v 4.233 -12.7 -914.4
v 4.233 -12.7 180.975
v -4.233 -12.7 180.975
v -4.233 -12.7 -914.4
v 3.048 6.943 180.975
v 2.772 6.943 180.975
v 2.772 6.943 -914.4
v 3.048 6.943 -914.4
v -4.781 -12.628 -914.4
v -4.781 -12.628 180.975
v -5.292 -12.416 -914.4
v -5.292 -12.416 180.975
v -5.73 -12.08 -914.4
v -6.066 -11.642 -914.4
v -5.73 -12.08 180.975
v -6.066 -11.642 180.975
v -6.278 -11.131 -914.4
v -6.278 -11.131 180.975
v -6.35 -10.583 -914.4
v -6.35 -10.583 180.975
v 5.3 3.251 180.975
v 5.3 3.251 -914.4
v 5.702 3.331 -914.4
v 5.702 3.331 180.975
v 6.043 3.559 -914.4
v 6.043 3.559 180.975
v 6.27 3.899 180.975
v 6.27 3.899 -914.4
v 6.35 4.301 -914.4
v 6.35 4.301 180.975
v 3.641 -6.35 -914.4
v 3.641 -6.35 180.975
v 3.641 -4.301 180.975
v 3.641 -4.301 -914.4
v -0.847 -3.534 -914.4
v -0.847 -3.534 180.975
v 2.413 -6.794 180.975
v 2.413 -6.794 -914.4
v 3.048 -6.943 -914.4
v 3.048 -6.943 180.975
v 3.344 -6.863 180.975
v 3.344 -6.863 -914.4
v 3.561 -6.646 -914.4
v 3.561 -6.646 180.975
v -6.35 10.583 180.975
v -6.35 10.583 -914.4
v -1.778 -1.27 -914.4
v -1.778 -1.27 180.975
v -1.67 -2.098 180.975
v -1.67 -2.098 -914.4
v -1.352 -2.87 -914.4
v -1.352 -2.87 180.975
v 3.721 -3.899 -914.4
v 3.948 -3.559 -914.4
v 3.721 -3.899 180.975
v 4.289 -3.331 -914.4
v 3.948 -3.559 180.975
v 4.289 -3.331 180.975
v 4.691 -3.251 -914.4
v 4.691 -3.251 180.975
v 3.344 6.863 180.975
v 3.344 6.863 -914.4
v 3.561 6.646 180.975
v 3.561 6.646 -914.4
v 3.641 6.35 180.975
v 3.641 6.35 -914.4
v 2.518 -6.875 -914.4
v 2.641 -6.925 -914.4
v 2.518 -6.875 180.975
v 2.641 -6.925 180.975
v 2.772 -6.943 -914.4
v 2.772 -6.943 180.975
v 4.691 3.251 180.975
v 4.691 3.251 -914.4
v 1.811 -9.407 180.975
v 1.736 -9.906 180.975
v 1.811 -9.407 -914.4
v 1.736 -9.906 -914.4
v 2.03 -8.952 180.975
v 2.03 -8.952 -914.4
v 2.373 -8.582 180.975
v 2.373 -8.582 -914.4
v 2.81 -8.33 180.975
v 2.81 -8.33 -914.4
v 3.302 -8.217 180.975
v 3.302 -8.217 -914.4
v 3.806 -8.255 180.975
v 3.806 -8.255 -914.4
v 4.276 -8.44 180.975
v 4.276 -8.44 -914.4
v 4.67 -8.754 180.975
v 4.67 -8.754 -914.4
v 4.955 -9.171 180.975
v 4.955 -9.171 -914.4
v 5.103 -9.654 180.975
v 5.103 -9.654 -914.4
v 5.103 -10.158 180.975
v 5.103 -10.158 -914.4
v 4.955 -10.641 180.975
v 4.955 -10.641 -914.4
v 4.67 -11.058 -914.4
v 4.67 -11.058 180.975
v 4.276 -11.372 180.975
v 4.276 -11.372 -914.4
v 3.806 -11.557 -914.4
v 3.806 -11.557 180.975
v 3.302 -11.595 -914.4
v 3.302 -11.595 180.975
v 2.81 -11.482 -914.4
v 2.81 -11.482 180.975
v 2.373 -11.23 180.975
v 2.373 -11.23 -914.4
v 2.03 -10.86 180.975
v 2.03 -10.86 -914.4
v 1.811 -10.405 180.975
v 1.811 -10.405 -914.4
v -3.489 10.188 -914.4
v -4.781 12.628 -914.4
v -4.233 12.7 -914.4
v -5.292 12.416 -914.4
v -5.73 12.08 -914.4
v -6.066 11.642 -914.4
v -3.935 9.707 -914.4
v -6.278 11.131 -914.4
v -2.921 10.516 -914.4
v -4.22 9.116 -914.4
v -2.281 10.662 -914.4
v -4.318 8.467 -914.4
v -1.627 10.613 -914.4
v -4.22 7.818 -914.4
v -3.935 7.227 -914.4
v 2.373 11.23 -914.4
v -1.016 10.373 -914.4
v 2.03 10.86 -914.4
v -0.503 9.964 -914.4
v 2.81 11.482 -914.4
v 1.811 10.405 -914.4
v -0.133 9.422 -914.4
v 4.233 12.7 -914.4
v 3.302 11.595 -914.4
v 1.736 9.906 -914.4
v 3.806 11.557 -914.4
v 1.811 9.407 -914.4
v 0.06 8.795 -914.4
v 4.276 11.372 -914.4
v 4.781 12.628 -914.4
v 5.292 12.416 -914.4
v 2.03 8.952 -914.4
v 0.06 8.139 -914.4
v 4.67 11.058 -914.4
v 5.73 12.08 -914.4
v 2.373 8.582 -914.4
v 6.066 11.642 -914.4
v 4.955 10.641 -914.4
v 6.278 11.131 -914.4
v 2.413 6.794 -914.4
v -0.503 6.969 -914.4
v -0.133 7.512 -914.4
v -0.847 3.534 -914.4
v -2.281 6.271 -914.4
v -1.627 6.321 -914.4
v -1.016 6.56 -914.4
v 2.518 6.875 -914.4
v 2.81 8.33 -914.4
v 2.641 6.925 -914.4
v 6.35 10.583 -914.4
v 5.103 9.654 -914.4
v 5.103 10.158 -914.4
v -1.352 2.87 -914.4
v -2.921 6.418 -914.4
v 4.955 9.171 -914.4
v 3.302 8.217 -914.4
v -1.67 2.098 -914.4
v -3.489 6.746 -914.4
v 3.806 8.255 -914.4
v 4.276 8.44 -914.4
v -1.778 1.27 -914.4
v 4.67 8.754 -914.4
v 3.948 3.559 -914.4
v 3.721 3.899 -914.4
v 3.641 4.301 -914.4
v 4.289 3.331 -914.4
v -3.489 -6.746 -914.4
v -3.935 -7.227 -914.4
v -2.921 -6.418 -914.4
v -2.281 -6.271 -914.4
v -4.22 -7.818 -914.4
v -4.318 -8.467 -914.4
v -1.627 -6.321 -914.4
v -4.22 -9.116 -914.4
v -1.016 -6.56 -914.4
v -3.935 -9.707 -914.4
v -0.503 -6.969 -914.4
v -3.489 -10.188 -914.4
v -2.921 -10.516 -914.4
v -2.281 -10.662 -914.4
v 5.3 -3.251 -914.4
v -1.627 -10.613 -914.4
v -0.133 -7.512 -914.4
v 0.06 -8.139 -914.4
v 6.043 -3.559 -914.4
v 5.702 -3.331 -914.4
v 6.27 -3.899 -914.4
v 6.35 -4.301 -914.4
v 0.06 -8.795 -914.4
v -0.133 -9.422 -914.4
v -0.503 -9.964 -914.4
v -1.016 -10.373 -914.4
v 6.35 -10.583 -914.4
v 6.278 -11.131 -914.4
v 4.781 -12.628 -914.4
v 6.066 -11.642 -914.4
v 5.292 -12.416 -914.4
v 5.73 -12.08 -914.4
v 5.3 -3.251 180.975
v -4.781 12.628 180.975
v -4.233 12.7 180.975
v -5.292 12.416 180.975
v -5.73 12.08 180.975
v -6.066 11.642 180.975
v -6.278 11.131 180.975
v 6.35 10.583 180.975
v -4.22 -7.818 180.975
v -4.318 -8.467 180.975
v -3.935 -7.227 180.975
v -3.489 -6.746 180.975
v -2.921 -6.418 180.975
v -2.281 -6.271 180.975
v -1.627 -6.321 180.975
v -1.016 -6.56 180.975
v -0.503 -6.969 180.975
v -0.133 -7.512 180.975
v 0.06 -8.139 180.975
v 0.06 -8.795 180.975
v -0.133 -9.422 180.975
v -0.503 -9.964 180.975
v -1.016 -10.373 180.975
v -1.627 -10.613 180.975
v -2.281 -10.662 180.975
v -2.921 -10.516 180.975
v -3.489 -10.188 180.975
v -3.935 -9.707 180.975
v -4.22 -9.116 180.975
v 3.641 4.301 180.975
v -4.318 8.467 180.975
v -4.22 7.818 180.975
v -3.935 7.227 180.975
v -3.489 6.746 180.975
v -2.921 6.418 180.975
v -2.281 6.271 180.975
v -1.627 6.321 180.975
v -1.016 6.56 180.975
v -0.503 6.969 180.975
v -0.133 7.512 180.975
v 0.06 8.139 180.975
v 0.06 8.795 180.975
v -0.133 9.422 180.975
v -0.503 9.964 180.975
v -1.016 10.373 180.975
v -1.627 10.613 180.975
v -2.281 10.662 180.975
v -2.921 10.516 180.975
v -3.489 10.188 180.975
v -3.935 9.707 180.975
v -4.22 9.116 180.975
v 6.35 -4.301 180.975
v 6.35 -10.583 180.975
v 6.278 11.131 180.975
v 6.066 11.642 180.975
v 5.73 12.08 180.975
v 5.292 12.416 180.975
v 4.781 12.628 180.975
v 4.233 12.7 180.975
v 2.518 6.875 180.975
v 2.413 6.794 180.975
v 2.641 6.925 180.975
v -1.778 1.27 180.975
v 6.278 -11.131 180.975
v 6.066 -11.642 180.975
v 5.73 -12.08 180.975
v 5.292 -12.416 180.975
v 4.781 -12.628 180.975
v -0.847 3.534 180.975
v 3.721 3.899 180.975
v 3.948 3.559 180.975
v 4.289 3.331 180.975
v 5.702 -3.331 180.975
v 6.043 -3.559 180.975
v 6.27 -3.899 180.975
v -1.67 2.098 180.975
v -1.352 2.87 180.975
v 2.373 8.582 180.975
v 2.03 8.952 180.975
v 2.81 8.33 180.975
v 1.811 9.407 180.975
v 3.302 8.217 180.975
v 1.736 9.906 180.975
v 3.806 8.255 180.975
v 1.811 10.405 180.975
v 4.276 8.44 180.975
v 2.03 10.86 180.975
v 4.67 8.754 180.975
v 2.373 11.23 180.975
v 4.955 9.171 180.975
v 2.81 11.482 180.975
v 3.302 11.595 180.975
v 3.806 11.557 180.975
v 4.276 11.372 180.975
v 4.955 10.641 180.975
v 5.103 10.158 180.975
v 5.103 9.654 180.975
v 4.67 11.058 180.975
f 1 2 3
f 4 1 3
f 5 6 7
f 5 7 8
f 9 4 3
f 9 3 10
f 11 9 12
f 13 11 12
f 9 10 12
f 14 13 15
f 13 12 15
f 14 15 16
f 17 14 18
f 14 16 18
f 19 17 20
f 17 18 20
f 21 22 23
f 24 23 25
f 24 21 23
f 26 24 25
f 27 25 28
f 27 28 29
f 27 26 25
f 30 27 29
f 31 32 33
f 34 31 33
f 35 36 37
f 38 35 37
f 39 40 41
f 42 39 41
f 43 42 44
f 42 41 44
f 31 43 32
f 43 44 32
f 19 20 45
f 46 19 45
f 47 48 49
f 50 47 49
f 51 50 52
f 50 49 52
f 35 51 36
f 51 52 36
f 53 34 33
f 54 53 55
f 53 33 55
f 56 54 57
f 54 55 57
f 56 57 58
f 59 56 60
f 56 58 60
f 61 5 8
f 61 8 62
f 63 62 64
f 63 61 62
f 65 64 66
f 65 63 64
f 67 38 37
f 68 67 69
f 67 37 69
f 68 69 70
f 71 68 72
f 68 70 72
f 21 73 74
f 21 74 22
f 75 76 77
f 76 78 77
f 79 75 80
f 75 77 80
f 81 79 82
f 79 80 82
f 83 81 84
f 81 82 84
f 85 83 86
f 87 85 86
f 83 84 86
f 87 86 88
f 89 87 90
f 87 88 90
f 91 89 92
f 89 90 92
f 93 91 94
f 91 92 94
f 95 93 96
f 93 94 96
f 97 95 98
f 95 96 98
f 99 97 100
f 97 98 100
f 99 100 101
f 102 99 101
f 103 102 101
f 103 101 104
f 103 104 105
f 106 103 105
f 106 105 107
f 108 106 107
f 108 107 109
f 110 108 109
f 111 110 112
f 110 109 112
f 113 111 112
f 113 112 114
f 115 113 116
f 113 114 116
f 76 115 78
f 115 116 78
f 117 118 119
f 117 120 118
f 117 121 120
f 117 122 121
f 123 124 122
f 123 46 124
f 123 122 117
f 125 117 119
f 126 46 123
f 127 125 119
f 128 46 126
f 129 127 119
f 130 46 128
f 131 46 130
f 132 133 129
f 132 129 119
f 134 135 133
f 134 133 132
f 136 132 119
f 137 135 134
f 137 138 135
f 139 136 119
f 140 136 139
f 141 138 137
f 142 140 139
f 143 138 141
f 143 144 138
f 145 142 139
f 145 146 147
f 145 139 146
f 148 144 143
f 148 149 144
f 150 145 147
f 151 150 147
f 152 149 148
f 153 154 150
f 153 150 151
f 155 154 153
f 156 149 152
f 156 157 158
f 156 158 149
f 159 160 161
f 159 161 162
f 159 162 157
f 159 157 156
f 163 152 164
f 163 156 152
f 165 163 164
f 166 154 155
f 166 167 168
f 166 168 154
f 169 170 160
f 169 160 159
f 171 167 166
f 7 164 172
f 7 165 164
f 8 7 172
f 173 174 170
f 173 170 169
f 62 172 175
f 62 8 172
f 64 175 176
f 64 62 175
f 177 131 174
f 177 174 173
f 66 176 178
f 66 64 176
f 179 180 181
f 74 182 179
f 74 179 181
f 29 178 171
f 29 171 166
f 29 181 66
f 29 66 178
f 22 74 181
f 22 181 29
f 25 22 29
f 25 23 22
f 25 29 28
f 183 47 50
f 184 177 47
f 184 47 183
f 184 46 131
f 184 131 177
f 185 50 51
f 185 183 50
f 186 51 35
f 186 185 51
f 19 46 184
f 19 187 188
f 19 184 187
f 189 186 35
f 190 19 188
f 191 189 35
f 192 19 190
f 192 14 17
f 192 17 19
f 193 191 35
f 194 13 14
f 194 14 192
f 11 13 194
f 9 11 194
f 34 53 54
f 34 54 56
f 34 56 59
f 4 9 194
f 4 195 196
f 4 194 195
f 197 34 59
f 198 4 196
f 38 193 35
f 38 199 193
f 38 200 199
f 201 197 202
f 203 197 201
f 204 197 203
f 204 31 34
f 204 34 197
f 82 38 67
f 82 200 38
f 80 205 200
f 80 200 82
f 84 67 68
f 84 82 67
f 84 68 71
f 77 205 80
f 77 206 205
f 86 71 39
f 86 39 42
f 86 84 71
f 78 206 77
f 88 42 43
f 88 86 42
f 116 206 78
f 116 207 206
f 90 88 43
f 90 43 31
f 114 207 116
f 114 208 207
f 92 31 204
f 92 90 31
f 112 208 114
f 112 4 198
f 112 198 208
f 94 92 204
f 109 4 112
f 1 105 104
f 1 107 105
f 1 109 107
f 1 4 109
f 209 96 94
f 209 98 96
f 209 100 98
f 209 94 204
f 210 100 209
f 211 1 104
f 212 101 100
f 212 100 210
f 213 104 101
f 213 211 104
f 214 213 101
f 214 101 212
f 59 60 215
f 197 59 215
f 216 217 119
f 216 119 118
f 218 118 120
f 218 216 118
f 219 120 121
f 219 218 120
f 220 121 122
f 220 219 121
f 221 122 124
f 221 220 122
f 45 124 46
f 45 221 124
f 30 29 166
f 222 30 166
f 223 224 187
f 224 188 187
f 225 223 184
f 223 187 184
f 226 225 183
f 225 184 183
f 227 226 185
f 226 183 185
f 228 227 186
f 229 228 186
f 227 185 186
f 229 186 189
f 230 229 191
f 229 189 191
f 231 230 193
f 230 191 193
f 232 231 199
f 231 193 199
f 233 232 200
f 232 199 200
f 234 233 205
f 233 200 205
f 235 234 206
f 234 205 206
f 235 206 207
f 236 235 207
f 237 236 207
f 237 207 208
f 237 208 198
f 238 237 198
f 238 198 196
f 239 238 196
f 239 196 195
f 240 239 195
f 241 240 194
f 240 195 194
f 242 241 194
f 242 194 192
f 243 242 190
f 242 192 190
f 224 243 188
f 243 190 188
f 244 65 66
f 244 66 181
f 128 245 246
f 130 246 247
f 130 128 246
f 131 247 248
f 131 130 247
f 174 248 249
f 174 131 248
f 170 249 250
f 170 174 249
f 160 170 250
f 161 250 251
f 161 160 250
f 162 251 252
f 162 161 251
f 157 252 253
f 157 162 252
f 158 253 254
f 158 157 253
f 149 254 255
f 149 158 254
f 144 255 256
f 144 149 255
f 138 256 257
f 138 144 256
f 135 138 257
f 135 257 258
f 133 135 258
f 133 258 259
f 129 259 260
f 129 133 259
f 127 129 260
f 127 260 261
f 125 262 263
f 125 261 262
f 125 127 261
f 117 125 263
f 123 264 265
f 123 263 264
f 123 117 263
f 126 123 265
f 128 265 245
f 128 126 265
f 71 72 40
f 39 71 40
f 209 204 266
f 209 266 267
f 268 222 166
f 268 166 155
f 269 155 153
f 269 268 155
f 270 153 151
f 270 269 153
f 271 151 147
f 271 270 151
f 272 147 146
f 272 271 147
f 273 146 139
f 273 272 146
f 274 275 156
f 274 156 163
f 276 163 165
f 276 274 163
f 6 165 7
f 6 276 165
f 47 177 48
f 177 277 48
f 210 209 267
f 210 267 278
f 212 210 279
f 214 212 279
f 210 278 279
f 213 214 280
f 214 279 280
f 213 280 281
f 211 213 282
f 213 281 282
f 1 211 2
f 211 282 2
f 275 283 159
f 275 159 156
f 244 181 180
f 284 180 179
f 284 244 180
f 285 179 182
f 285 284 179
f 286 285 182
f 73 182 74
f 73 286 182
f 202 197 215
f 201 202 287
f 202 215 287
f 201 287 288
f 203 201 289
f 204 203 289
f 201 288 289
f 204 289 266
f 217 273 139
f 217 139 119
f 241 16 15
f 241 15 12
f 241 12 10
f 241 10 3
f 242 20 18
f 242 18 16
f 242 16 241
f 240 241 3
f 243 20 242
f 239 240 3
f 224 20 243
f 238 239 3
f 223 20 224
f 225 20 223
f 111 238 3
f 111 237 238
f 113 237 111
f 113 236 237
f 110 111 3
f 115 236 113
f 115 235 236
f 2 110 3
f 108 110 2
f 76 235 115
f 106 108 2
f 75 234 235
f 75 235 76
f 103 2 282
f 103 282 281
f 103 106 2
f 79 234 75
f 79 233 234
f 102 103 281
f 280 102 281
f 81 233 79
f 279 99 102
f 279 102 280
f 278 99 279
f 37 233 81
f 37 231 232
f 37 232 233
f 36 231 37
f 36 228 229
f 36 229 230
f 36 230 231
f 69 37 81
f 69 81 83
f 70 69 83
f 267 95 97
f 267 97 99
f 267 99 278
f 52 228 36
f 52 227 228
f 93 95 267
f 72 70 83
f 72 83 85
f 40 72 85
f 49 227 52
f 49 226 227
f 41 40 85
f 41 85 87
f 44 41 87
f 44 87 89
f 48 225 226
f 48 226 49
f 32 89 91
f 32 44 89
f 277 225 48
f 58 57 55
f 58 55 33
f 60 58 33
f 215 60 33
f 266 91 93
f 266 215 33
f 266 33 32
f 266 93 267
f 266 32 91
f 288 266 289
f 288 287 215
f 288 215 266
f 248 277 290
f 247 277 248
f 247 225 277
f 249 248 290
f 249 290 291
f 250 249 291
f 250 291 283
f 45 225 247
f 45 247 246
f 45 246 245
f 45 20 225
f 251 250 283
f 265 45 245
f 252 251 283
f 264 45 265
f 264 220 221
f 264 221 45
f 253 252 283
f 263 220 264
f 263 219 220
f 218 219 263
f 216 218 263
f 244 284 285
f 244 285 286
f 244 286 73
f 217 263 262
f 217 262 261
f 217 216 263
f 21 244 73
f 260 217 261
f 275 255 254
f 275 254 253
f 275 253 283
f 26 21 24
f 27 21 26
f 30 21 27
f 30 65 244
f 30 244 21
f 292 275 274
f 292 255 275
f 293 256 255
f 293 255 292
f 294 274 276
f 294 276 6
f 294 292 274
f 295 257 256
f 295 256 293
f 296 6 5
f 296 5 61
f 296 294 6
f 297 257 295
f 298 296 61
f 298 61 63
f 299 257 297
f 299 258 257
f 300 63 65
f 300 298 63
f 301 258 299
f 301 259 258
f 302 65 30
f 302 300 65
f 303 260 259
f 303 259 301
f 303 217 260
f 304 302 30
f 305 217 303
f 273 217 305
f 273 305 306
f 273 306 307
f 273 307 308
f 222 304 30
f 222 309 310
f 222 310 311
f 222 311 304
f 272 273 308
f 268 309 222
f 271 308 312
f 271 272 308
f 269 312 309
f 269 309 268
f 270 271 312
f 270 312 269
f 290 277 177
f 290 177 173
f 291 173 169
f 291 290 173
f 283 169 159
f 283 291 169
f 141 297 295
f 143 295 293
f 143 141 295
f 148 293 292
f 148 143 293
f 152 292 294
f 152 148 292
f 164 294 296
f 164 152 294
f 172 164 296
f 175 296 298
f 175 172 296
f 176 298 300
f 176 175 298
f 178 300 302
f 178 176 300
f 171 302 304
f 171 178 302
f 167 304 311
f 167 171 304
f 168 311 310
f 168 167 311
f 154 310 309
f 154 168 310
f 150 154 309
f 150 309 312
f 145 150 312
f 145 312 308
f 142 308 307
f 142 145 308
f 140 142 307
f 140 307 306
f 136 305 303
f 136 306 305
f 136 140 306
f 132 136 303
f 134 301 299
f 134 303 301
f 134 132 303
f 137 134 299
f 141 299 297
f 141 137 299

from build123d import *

# Parameters (mm, degrees)
SKETCH3_R           = 2.201333333
SKETCH3_R_2         = 1.693333333
BOSS_EXTRUDE1_DEPTH = 914.4
CUT_EXTRUDE1_DEPTH  = 733.425


with BuildPart() as part:
    # Sketch3 → Boss-Extrude1 (new, symmetric)
    with BuildSketch(Plane.XY):
        with BuildLine():
            Line((-1.778, 0), (-1.778, 1.27))
            ThreePointArc((-1.778, 1.27), (-1.536070654, 2.494011801), (-0.846666667, 3.533942971))
            Line((-0.846666667, 3.533942971), (2.413267273, 6.793876912))
            ThreePointArc((2.413267273, 6.793876912), (2.578074335, 6.903997469), (2.772477518, 6.942666667))
            Line((2.772477518, 6.942666667), (3.048, 6.942666667))
            ThreePointArc((3.048, 6.942666667), (3.467078619, 6.769078619), (3.640666667, 6.35))
            Line((3.640666667, 6.35), (3.640666667, 4.301066667))
            ThreePointArc((3.640666667, 4.301066667), (3.948165494, 3.558698827), (4.690533333, 3.2512))
            Line((4.690533333, 3.2512), (5.300133333, 3.2512))
            ThreePointArc((5.300133333, 3.2512), (6.042501173, 3.558698827), (6.35, 4.301066667))
            Line((6.35, 4.301066667), (6.35, 10.583333333))
            ThreePointArc((6.35, 10.583333333), (5.730042687, 12.080042687), (4.233333333, 12.7))
            Line((4.233333333, 12.7), (-4.233333333, 12.7))
            ThreePointArc((-4.233333333, 12.7), (-5.730042687, 12.080042687), (-6.35, 10.583333333))
            Line((-6.35, 10.583333333), (-6.35, 0))
            Line((-6.35, 0), (-1.778, 0))
        make_face()
        with Locations(Location((-2.116666667, 8.466666667, 0), (0, 0, 180))):
            Circle(SKETCH3_R, mode=Mode.SUBTRACT)
        with Locations(Location((3.429, 9.906, 0), (0, 0, 180))):
            Circle(SKETCH3_R_2, mode=Mode.SUBTRACT)
    extrude(amount=BOSS_EXTRUDE1_DEPTH, both=True)

    # Mirror1: part across plane


with BuildPart() as part_1:
    add(part.part)
    add(part.part.mirror(Plane.ZX))

    # Sketch4 → Cut-Extrude1 (cut)
    with BuildSketch(Plane.XY.offset(914.4)):
        with BuildLine():
            Line((-6.35, 10.583333333), (-6.35, -10.583333333))
            ThreePointArc((-6.35, -10.583333333), (-5.730042687, -12.080042687), (-4.233333333, -12.7))
            Line((-4.233333333, -12.7), (4.233333333, -12.7))
            ThreePointArc((4.233333333, -12.7), (5.730042687, -12.080042687), (6.35, -10.583333333))
            Line((6.35, -10.583333333), (6.35, -4.301066667))
            ThreePointArc((6.35, -4.301066667), (6.042501173, -3.558698827), (5.300133333, -3.2512))
            Line((5.300133333, -3.2512), (4.690533333, -3.2512))
            ThreePointArc((4.690533333, -3.2512), (3.948165494, -3.558698827), (3.640666667, -4.301066667))
            Line((3.640666667, -4.301066667), (3.640666667, -6.35))
            ThreePointArc((3.640666667, -6.35), (3.467078619, -6.769078619), (3.048, -6.942666667))
            Line((3.048, -6.942666667), (2.772477518, -6.942666667))
            ThreePointArc((2.772477518, -6.942666667), (2.578074335, -6.903997469), (2.413267273, -6.793876912))
            Line((2.413267273, -6.793876912), (-0.846666667, -3.533942971))
            ThreePointArc((-0.846666667, -3.533942971), (-1.536070654, -2.494011801), (-1.778, -1.27))
            Line((-1.778, -1.27), (-1.778, 1.27))
            ThreePointArc((-1.778, 1.27), (-1.536070654, 2.494011801), (-0.846666667, 3.533942971))
            Line((-0.846666667, 3.533942971), (2.413267273, 6.793876912))
            ThreePointArc((2.413267273, 6.793876912), (2.578074335, 6.903997469), (2.772477518, 6.942666667))
            Line((2.772477518, 6.942666667), (3.048, 6.942666667))
            ThreePointArc((3.048, 6.942666667), (3.467078619, 6.769078619), (3.640666667, 6.35))
            Line((3.640666667, 6.35), (3.640666667, 4.301066667))
            ThreePointArc((3.640666667, 4.301066667), (3.948165494, 3.558698827), (4.690533333, 3.2512))
            Line((4.690533333, 3.2512), (5.300133333, 3.2512))
            ThreePointArc((5.300133333, 3.2512), (6.042501173, 3.558698827), (6.35, 4.301066667))
            Line((6.35, 4.301066667), (6.35, 10.583333333))
            ThreePointArc((6.35, 10.583333333), (5.730042687, 12.080042687), (4.233333333, 12.7))
            Line((4.233333333, 12.7), (-4.233333333, 12.7))
            ThreePointArc((-4.233333333, 12.7), (-5.730042687, 12.080042687), (-6.35, 10.583333333))
        make_face()
    extrude(amount=-CUT_EXTRUDE1_DEPTH, mode=Mode.SUBTRACT)


solid = part_1.part
